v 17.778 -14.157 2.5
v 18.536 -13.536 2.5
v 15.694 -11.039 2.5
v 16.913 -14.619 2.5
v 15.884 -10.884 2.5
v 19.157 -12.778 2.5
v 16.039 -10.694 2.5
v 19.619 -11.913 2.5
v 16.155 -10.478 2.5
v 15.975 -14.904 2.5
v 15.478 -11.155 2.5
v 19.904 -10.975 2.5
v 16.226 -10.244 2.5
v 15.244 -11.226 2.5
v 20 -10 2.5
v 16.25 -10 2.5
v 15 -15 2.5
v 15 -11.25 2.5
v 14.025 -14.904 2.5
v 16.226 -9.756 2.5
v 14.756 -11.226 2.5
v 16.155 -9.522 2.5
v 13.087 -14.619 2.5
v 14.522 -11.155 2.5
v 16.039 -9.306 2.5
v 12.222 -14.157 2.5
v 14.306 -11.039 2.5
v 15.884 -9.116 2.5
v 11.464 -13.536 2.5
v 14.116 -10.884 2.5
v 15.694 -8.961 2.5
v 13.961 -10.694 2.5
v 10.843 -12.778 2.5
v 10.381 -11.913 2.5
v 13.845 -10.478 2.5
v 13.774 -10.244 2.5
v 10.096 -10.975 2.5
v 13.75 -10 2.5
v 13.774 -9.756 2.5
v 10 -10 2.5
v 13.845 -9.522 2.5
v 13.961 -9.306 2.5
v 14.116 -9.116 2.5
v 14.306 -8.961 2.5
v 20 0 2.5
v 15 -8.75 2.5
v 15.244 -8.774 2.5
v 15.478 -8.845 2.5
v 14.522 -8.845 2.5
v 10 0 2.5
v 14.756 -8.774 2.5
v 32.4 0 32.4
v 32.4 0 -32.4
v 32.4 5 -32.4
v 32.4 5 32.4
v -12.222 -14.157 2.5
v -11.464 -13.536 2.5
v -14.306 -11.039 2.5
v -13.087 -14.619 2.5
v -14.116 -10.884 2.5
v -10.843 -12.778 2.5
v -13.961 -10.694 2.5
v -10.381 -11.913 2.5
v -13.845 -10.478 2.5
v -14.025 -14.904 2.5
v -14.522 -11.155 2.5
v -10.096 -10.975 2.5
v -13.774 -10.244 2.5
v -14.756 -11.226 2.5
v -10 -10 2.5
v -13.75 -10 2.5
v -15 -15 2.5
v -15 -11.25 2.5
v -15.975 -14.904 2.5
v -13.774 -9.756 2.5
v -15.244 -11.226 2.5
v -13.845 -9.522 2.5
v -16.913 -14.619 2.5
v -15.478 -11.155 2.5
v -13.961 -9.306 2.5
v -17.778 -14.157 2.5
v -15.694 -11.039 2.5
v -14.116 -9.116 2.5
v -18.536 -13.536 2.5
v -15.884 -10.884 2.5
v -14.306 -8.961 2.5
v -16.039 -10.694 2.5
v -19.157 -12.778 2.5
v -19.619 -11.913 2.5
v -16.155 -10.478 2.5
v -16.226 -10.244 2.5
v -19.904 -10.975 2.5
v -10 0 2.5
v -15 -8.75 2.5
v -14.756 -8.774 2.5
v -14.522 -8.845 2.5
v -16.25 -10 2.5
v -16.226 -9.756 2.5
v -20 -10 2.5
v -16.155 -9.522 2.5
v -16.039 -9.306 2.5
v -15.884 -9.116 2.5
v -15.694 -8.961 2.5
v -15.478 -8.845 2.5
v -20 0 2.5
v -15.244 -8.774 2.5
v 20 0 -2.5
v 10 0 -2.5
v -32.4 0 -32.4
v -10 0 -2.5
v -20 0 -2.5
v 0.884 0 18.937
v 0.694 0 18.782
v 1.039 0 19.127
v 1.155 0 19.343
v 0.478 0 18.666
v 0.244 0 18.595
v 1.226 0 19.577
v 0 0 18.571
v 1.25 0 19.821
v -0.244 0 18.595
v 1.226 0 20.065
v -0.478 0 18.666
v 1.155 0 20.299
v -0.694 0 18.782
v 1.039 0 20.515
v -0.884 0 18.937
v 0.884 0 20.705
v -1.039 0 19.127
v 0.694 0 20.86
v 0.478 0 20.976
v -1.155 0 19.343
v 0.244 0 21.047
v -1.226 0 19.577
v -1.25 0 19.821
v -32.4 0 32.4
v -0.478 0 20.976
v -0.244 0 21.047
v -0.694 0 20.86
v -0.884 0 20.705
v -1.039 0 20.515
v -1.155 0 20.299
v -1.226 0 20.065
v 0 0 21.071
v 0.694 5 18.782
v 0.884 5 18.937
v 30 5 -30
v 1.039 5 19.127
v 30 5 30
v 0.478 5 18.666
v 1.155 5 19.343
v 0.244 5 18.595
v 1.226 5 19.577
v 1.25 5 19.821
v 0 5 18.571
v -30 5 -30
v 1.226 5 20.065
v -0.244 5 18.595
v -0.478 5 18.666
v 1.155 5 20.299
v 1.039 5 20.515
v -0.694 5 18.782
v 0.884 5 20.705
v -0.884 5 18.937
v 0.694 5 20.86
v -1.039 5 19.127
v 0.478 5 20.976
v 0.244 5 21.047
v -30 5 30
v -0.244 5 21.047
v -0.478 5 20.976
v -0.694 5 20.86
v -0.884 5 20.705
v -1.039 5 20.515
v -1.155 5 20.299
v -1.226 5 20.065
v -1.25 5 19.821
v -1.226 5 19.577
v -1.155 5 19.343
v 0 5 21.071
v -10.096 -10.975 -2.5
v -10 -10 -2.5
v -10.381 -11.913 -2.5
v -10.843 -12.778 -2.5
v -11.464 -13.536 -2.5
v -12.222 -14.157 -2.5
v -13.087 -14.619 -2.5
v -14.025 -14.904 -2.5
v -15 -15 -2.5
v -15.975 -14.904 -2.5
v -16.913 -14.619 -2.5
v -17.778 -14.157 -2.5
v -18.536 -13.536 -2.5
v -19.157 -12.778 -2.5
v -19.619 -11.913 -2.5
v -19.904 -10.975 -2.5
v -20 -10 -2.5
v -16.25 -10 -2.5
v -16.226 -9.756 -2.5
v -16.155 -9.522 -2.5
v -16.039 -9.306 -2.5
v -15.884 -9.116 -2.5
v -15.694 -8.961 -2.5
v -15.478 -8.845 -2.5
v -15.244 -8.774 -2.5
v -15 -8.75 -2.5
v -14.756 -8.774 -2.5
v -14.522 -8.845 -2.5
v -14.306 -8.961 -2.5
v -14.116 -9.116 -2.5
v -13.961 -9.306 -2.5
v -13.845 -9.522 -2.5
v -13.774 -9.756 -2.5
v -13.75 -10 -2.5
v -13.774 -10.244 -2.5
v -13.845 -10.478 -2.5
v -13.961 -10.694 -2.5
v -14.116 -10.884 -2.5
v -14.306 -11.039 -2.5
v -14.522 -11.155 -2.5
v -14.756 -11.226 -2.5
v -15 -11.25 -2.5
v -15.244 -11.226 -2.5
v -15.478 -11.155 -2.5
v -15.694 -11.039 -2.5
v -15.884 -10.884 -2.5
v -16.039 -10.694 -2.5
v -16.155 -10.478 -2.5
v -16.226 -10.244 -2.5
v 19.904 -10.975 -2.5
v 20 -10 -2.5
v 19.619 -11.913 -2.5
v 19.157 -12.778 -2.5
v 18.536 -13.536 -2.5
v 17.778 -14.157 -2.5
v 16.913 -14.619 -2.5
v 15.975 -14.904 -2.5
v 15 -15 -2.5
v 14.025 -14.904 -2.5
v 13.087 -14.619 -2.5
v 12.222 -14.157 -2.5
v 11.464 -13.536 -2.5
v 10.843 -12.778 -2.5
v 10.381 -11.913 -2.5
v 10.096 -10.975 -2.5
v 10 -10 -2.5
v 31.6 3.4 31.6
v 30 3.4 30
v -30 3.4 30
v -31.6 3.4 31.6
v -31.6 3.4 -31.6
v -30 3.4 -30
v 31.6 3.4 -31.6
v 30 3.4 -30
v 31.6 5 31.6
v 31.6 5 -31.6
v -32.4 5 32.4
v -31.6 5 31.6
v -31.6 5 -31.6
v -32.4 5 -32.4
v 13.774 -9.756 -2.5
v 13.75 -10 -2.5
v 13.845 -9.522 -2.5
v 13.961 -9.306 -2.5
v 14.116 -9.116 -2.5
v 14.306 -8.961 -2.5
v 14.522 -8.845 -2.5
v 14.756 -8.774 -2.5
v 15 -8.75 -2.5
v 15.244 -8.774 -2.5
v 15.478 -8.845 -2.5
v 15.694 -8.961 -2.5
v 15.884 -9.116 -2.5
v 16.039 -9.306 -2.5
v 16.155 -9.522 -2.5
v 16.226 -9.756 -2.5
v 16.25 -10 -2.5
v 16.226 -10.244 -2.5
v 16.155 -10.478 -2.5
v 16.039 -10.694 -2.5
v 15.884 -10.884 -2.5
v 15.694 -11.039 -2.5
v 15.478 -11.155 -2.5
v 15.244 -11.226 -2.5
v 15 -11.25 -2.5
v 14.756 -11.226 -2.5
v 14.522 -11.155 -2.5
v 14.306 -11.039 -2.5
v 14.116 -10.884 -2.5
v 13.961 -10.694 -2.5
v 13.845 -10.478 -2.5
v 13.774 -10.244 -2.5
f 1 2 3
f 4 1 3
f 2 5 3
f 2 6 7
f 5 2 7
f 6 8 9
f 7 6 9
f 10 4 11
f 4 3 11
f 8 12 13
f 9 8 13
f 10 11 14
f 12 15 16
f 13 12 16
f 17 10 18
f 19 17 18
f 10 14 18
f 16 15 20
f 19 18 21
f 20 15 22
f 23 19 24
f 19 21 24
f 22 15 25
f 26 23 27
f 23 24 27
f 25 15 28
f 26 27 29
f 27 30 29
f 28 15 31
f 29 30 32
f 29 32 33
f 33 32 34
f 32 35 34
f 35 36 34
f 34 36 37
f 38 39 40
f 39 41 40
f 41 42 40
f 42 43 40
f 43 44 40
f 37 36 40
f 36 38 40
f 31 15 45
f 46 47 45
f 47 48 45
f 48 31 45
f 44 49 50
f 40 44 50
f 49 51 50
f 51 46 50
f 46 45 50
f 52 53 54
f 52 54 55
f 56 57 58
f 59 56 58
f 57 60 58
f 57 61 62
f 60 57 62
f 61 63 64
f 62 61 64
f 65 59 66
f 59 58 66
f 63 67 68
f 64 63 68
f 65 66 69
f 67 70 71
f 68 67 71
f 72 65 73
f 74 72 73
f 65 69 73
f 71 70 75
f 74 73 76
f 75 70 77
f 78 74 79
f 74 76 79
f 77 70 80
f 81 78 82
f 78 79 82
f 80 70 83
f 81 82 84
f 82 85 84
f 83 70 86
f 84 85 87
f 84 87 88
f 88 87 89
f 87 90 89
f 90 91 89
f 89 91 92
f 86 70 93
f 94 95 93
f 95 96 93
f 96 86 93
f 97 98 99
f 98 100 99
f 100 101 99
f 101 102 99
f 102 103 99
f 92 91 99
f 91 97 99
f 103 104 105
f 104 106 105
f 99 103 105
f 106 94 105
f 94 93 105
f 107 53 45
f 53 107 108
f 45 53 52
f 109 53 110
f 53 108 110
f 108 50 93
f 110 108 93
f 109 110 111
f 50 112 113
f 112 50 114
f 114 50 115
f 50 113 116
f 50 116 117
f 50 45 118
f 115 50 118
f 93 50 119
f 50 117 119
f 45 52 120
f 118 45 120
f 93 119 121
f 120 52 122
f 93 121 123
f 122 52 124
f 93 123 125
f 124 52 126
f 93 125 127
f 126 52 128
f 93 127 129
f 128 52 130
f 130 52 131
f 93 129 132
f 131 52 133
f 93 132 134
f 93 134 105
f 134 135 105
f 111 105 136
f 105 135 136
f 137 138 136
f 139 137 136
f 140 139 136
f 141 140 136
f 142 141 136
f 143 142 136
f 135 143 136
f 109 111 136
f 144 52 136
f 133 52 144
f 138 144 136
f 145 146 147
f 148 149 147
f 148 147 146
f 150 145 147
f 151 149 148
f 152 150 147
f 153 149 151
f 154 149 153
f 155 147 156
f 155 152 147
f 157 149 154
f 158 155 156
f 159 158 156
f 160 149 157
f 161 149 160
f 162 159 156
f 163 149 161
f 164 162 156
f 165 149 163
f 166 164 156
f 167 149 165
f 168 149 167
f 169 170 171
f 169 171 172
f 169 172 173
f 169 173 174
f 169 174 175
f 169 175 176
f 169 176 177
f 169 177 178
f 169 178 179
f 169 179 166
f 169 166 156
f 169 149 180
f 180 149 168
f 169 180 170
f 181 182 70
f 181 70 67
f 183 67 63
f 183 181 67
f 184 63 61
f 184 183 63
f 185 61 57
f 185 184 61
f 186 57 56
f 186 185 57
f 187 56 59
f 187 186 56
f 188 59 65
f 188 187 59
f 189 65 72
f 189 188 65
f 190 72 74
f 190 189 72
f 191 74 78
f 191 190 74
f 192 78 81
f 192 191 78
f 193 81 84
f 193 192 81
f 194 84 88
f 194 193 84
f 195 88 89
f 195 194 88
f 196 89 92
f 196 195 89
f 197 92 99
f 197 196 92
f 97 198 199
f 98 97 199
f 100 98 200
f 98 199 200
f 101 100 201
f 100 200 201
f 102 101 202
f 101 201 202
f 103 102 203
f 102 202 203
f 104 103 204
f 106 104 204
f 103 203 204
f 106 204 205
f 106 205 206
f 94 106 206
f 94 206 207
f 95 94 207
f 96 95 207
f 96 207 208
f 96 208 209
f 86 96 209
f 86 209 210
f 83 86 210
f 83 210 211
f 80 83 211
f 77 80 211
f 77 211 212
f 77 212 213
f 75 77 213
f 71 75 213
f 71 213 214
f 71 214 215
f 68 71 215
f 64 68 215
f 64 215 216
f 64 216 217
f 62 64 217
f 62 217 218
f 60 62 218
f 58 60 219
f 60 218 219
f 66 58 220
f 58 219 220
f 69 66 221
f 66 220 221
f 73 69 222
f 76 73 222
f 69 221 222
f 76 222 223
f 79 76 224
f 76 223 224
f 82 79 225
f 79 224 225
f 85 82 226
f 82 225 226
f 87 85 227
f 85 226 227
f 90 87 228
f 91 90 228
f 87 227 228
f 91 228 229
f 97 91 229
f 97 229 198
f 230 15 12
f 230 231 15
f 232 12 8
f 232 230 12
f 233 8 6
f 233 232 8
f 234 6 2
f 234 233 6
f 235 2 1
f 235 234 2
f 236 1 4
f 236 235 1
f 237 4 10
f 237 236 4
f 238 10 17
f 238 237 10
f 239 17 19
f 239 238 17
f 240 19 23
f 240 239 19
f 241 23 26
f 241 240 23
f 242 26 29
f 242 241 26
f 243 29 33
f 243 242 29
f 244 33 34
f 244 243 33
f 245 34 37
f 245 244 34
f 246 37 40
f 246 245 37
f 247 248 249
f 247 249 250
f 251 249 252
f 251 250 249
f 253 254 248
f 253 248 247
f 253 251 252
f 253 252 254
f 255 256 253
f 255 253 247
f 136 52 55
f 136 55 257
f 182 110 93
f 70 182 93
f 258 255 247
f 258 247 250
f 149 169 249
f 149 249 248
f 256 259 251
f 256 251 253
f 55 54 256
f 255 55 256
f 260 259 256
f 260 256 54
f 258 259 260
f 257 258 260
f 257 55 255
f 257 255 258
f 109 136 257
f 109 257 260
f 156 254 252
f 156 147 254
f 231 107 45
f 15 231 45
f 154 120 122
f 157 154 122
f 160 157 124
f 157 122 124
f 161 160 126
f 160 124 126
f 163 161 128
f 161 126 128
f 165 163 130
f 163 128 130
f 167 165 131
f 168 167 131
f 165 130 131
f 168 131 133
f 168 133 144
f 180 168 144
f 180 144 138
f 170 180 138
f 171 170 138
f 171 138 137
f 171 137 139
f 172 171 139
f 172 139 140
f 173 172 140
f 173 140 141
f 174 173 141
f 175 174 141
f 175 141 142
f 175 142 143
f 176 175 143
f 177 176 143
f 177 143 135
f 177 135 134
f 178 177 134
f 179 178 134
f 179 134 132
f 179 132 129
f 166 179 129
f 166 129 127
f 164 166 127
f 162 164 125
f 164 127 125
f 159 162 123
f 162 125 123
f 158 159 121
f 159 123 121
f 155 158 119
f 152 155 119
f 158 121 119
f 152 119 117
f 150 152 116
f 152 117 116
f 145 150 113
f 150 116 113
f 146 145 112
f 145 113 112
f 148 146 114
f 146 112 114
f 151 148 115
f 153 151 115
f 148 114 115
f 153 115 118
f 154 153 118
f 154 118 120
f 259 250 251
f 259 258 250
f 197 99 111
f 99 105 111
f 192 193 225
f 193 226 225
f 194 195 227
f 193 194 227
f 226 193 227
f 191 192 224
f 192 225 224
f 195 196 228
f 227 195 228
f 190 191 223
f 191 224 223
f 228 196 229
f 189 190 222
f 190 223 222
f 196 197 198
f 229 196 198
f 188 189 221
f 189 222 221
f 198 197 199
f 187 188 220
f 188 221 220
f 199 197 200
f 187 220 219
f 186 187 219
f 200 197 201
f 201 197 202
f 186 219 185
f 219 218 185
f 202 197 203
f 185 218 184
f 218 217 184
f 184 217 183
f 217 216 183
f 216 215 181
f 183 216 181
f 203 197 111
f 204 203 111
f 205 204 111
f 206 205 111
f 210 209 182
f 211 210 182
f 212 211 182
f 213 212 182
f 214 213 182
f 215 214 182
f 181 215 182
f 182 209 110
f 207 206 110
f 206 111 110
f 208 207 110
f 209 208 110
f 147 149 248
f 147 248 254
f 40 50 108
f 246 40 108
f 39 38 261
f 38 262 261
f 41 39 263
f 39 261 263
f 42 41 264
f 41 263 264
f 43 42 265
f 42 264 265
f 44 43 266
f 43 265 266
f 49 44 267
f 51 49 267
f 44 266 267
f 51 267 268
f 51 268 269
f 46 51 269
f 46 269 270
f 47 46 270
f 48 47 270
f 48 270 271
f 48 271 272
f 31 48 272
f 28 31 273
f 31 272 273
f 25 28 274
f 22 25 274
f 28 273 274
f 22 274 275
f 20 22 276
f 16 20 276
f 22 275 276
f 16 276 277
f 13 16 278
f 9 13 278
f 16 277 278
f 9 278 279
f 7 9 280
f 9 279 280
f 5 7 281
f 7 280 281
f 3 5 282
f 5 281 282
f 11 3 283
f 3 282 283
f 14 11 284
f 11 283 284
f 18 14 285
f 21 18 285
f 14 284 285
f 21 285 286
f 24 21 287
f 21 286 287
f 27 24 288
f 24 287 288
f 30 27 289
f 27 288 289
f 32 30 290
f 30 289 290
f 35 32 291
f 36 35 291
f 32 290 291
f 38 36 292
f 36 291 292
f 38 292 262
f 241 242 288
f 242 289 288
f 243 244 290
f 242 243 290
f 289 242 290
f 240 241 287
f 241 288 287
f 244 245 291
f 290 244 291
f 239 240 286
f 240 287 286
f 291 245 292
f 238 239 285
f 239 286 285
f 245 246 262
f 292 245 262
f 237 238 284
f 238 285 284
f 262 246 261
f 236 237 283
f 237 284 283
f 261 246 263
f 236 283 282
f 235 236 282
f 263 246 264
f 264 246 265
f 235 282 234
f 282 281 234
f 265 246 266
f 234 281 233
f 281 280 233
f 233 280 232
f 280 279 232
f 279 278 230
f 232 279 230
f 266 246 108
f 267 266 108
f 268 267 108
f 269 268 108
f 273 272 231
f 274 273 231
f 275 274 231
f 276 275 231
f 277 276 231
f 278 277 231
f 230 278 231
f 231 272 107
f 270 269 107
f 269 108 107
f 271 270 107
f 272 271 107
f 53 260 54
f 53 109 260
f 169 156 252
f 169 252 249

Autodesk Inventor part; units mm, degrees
ref_plane "YZ Plane" through (0, 0, 0) normal (1, 0, 0) x (0, 1, 0)
ref_plane "XZ Plane" through (0, 0, 0) normal (0, 1, 0) x (-1, 0, 0)
ref_plane "XY Plane" through (0, 0, 0) normal (0, 0, 1) x (1, 0, 0)
sketch "스케치1" plane through (0, 0, 0) normal (0, 1, 0) x (-1, 0, 0)
  line L0 (-30, 30) -> (30, 30)
  line L1 (30, 30) -> (30, -30)
  line L2 (30, -30) -> (-30, -30)
  line L3 (-30, -30) -> (-30, 30)
  line L4 (-30, 30) -> (30, -30) construction
  line L5 (30, 30) -> (-30, -30) construction
  line L6 (-32.4, 32.4) -> (32.4, 32.4)
  line L7 (32.4, 32.4) -> (32.4, -32.4)
  line L8 (32.4, -32.4) -> (-32.4, -32.4)
  line L9 (-32.4, -32.4) -> (-32.4, 32.4)
  line L10 (-32.4, 32.4) -> (32.4, -32.4) construction
  line L11 (32.4, 32.4) -> (-32.4, -32.4) construction
  point P0 (0, 0)
  dimension "d45" = 60
  dimension "d46" = 60
  dimension "d47" = 2.4
extrude "돌출7" add sketch "스케치1" along normal blind 5 contours L0 L1 L2 L3 | L6 L7 L8 L9
sketch "스케치7" plane through (0, 5, 0) normal (0, 1, 0) x (1, 0, 0)
  line L0 (-30, -30) -> (30, -30)
  line L1 (30, -30) -> (30, 30)
  line L2 (30, 30) -> (-30, 30)
  line L3 (-30, 30) -> (-30, -30)
  line L4 (-30, -30) -> (30, 30) construction
  line L5 (30, -30) -> (-30, 30) construction
  line L6 (31.6, -31.6) -> (-31.6, -31.6)
  line L7 (-31.6, -31.6) -> (-31.6, 31.6)
  line L8 (-31.6, 31.6) -> (31.6, 31.6)
  line L9 (31.6, 31.6) -> (31.6, -31.6)
  line L10 (31.6, -31.6) -> (-31.6, 31.6) construction
  line L11 (-31.6, -31.6) -> (31.6, 31.6) construction
  point P0 (0, 0)
  dimension "d50" = 60
  dimension "d51" = 60
  dimension "d52" = 1.6
extrude "돌출8" cut sketch "스케치7" against normal blind 1.6
sketch "스케치8" plane through (0, 0, 0) normal (0, -1, 0) x (1, 0, 0)
  line L0 (-20, -2.5) -> (-10, -2.5)
  line L1 (-10, -2.5) -> (-10, 2.5)
  line L2 (-10, 2.5) -> (-20, 2.5)
  line L3 (-20, 2.5) -> (-20, -2.5)
  line L4 (-20, -2.5) -> (-10, 2.5) construction
  line L5 (-10, -2.5) -> (-20, 2.5) construction
  line L6 (10, -2.5) -> (20, -2.5)
  line L7 (20, -2.5) -> (20, 2.5)
  line L8 (20, 2.5) -> (10, 2.5)
  line L9 (10, 2.5) -> (10, -2.5)
  line L10 (10, -2.5) -> (20, 2.5) construction
  line L11 (20, -2.5) -> (10, 2.5) construction
  line L12 (32.4, 32.4) -> (32.4, -32.4) projected
  line L13 (32.4, 0) -> (20, 0)
  line L14 (-20, 0) -> (-32.4, 0)
  line L15 (-32.4, -32.4) -> (-32.4, 32.4) projected
  point P0 (0, 0)
  point P1 (-15, 0)
  point P2 (15, 0)
  dimension "d55" = 10
  dimension "d56" = 5
  dimension "d57" = 20
  dimension "d58" = 10
  dimension "d61" = 12.4
extrude "돌출9" add sketch "스케치8" along normal blind 10
sketch "스케치9" plane through (-10, 0, -2.5) normal (0, 0, -1) x (-1, 0, 0)
  line L0 (10, -10) -> (0, -10) projected
  circle A0 centre (5, -10) radius 5
  line L1 (-20, -10) -> (-30, -10) projected
  circle A1 centre (-25, -10) radius 5
  point P0 (-10, 0)
  dimension "d64" = 10
  dimension "d65" = 10
extrude "돌출10" add sketch "스케치9" against normal blind 5
sketch "스케치10" plane through (-10, 0, -2.5) normal (0, 0, -1) x (-1, 0, 0)
  arc A0 (0, -10) -> (10, -10) centre (5, -10) ccw projected
  circle A1 centre (5, -10) radius 1.25
  arc A2 (-30, -10) -> (-20, -10) centre (-25, -10) ccw projected
  circle A3 centre (-25, -10) radius 1.25
  point P0 (-10, 0)
  dimension "d68" = 2.5
  dimension "d69" = 2.5
extrude "돌출11" cut sketch "스케치10" against normal blind 5
sketch "스케치11" plane through (0, 0, 0) normal (0, -1, 0) x (1, 0, 0)
  circle A0 centre (0, 19.821) radius 1.25
  line L0 (-20, 2.5) -> (-10, 2.5) projected
  point P0 (0, 0)
  dimension "d72" = 2.5
  dimension "d73" = 17.321
extrude "돌출12" cut sketch "스케치11" against normal blind 5
properties part number "사각형 OV-PAM 5패턴 상단"
